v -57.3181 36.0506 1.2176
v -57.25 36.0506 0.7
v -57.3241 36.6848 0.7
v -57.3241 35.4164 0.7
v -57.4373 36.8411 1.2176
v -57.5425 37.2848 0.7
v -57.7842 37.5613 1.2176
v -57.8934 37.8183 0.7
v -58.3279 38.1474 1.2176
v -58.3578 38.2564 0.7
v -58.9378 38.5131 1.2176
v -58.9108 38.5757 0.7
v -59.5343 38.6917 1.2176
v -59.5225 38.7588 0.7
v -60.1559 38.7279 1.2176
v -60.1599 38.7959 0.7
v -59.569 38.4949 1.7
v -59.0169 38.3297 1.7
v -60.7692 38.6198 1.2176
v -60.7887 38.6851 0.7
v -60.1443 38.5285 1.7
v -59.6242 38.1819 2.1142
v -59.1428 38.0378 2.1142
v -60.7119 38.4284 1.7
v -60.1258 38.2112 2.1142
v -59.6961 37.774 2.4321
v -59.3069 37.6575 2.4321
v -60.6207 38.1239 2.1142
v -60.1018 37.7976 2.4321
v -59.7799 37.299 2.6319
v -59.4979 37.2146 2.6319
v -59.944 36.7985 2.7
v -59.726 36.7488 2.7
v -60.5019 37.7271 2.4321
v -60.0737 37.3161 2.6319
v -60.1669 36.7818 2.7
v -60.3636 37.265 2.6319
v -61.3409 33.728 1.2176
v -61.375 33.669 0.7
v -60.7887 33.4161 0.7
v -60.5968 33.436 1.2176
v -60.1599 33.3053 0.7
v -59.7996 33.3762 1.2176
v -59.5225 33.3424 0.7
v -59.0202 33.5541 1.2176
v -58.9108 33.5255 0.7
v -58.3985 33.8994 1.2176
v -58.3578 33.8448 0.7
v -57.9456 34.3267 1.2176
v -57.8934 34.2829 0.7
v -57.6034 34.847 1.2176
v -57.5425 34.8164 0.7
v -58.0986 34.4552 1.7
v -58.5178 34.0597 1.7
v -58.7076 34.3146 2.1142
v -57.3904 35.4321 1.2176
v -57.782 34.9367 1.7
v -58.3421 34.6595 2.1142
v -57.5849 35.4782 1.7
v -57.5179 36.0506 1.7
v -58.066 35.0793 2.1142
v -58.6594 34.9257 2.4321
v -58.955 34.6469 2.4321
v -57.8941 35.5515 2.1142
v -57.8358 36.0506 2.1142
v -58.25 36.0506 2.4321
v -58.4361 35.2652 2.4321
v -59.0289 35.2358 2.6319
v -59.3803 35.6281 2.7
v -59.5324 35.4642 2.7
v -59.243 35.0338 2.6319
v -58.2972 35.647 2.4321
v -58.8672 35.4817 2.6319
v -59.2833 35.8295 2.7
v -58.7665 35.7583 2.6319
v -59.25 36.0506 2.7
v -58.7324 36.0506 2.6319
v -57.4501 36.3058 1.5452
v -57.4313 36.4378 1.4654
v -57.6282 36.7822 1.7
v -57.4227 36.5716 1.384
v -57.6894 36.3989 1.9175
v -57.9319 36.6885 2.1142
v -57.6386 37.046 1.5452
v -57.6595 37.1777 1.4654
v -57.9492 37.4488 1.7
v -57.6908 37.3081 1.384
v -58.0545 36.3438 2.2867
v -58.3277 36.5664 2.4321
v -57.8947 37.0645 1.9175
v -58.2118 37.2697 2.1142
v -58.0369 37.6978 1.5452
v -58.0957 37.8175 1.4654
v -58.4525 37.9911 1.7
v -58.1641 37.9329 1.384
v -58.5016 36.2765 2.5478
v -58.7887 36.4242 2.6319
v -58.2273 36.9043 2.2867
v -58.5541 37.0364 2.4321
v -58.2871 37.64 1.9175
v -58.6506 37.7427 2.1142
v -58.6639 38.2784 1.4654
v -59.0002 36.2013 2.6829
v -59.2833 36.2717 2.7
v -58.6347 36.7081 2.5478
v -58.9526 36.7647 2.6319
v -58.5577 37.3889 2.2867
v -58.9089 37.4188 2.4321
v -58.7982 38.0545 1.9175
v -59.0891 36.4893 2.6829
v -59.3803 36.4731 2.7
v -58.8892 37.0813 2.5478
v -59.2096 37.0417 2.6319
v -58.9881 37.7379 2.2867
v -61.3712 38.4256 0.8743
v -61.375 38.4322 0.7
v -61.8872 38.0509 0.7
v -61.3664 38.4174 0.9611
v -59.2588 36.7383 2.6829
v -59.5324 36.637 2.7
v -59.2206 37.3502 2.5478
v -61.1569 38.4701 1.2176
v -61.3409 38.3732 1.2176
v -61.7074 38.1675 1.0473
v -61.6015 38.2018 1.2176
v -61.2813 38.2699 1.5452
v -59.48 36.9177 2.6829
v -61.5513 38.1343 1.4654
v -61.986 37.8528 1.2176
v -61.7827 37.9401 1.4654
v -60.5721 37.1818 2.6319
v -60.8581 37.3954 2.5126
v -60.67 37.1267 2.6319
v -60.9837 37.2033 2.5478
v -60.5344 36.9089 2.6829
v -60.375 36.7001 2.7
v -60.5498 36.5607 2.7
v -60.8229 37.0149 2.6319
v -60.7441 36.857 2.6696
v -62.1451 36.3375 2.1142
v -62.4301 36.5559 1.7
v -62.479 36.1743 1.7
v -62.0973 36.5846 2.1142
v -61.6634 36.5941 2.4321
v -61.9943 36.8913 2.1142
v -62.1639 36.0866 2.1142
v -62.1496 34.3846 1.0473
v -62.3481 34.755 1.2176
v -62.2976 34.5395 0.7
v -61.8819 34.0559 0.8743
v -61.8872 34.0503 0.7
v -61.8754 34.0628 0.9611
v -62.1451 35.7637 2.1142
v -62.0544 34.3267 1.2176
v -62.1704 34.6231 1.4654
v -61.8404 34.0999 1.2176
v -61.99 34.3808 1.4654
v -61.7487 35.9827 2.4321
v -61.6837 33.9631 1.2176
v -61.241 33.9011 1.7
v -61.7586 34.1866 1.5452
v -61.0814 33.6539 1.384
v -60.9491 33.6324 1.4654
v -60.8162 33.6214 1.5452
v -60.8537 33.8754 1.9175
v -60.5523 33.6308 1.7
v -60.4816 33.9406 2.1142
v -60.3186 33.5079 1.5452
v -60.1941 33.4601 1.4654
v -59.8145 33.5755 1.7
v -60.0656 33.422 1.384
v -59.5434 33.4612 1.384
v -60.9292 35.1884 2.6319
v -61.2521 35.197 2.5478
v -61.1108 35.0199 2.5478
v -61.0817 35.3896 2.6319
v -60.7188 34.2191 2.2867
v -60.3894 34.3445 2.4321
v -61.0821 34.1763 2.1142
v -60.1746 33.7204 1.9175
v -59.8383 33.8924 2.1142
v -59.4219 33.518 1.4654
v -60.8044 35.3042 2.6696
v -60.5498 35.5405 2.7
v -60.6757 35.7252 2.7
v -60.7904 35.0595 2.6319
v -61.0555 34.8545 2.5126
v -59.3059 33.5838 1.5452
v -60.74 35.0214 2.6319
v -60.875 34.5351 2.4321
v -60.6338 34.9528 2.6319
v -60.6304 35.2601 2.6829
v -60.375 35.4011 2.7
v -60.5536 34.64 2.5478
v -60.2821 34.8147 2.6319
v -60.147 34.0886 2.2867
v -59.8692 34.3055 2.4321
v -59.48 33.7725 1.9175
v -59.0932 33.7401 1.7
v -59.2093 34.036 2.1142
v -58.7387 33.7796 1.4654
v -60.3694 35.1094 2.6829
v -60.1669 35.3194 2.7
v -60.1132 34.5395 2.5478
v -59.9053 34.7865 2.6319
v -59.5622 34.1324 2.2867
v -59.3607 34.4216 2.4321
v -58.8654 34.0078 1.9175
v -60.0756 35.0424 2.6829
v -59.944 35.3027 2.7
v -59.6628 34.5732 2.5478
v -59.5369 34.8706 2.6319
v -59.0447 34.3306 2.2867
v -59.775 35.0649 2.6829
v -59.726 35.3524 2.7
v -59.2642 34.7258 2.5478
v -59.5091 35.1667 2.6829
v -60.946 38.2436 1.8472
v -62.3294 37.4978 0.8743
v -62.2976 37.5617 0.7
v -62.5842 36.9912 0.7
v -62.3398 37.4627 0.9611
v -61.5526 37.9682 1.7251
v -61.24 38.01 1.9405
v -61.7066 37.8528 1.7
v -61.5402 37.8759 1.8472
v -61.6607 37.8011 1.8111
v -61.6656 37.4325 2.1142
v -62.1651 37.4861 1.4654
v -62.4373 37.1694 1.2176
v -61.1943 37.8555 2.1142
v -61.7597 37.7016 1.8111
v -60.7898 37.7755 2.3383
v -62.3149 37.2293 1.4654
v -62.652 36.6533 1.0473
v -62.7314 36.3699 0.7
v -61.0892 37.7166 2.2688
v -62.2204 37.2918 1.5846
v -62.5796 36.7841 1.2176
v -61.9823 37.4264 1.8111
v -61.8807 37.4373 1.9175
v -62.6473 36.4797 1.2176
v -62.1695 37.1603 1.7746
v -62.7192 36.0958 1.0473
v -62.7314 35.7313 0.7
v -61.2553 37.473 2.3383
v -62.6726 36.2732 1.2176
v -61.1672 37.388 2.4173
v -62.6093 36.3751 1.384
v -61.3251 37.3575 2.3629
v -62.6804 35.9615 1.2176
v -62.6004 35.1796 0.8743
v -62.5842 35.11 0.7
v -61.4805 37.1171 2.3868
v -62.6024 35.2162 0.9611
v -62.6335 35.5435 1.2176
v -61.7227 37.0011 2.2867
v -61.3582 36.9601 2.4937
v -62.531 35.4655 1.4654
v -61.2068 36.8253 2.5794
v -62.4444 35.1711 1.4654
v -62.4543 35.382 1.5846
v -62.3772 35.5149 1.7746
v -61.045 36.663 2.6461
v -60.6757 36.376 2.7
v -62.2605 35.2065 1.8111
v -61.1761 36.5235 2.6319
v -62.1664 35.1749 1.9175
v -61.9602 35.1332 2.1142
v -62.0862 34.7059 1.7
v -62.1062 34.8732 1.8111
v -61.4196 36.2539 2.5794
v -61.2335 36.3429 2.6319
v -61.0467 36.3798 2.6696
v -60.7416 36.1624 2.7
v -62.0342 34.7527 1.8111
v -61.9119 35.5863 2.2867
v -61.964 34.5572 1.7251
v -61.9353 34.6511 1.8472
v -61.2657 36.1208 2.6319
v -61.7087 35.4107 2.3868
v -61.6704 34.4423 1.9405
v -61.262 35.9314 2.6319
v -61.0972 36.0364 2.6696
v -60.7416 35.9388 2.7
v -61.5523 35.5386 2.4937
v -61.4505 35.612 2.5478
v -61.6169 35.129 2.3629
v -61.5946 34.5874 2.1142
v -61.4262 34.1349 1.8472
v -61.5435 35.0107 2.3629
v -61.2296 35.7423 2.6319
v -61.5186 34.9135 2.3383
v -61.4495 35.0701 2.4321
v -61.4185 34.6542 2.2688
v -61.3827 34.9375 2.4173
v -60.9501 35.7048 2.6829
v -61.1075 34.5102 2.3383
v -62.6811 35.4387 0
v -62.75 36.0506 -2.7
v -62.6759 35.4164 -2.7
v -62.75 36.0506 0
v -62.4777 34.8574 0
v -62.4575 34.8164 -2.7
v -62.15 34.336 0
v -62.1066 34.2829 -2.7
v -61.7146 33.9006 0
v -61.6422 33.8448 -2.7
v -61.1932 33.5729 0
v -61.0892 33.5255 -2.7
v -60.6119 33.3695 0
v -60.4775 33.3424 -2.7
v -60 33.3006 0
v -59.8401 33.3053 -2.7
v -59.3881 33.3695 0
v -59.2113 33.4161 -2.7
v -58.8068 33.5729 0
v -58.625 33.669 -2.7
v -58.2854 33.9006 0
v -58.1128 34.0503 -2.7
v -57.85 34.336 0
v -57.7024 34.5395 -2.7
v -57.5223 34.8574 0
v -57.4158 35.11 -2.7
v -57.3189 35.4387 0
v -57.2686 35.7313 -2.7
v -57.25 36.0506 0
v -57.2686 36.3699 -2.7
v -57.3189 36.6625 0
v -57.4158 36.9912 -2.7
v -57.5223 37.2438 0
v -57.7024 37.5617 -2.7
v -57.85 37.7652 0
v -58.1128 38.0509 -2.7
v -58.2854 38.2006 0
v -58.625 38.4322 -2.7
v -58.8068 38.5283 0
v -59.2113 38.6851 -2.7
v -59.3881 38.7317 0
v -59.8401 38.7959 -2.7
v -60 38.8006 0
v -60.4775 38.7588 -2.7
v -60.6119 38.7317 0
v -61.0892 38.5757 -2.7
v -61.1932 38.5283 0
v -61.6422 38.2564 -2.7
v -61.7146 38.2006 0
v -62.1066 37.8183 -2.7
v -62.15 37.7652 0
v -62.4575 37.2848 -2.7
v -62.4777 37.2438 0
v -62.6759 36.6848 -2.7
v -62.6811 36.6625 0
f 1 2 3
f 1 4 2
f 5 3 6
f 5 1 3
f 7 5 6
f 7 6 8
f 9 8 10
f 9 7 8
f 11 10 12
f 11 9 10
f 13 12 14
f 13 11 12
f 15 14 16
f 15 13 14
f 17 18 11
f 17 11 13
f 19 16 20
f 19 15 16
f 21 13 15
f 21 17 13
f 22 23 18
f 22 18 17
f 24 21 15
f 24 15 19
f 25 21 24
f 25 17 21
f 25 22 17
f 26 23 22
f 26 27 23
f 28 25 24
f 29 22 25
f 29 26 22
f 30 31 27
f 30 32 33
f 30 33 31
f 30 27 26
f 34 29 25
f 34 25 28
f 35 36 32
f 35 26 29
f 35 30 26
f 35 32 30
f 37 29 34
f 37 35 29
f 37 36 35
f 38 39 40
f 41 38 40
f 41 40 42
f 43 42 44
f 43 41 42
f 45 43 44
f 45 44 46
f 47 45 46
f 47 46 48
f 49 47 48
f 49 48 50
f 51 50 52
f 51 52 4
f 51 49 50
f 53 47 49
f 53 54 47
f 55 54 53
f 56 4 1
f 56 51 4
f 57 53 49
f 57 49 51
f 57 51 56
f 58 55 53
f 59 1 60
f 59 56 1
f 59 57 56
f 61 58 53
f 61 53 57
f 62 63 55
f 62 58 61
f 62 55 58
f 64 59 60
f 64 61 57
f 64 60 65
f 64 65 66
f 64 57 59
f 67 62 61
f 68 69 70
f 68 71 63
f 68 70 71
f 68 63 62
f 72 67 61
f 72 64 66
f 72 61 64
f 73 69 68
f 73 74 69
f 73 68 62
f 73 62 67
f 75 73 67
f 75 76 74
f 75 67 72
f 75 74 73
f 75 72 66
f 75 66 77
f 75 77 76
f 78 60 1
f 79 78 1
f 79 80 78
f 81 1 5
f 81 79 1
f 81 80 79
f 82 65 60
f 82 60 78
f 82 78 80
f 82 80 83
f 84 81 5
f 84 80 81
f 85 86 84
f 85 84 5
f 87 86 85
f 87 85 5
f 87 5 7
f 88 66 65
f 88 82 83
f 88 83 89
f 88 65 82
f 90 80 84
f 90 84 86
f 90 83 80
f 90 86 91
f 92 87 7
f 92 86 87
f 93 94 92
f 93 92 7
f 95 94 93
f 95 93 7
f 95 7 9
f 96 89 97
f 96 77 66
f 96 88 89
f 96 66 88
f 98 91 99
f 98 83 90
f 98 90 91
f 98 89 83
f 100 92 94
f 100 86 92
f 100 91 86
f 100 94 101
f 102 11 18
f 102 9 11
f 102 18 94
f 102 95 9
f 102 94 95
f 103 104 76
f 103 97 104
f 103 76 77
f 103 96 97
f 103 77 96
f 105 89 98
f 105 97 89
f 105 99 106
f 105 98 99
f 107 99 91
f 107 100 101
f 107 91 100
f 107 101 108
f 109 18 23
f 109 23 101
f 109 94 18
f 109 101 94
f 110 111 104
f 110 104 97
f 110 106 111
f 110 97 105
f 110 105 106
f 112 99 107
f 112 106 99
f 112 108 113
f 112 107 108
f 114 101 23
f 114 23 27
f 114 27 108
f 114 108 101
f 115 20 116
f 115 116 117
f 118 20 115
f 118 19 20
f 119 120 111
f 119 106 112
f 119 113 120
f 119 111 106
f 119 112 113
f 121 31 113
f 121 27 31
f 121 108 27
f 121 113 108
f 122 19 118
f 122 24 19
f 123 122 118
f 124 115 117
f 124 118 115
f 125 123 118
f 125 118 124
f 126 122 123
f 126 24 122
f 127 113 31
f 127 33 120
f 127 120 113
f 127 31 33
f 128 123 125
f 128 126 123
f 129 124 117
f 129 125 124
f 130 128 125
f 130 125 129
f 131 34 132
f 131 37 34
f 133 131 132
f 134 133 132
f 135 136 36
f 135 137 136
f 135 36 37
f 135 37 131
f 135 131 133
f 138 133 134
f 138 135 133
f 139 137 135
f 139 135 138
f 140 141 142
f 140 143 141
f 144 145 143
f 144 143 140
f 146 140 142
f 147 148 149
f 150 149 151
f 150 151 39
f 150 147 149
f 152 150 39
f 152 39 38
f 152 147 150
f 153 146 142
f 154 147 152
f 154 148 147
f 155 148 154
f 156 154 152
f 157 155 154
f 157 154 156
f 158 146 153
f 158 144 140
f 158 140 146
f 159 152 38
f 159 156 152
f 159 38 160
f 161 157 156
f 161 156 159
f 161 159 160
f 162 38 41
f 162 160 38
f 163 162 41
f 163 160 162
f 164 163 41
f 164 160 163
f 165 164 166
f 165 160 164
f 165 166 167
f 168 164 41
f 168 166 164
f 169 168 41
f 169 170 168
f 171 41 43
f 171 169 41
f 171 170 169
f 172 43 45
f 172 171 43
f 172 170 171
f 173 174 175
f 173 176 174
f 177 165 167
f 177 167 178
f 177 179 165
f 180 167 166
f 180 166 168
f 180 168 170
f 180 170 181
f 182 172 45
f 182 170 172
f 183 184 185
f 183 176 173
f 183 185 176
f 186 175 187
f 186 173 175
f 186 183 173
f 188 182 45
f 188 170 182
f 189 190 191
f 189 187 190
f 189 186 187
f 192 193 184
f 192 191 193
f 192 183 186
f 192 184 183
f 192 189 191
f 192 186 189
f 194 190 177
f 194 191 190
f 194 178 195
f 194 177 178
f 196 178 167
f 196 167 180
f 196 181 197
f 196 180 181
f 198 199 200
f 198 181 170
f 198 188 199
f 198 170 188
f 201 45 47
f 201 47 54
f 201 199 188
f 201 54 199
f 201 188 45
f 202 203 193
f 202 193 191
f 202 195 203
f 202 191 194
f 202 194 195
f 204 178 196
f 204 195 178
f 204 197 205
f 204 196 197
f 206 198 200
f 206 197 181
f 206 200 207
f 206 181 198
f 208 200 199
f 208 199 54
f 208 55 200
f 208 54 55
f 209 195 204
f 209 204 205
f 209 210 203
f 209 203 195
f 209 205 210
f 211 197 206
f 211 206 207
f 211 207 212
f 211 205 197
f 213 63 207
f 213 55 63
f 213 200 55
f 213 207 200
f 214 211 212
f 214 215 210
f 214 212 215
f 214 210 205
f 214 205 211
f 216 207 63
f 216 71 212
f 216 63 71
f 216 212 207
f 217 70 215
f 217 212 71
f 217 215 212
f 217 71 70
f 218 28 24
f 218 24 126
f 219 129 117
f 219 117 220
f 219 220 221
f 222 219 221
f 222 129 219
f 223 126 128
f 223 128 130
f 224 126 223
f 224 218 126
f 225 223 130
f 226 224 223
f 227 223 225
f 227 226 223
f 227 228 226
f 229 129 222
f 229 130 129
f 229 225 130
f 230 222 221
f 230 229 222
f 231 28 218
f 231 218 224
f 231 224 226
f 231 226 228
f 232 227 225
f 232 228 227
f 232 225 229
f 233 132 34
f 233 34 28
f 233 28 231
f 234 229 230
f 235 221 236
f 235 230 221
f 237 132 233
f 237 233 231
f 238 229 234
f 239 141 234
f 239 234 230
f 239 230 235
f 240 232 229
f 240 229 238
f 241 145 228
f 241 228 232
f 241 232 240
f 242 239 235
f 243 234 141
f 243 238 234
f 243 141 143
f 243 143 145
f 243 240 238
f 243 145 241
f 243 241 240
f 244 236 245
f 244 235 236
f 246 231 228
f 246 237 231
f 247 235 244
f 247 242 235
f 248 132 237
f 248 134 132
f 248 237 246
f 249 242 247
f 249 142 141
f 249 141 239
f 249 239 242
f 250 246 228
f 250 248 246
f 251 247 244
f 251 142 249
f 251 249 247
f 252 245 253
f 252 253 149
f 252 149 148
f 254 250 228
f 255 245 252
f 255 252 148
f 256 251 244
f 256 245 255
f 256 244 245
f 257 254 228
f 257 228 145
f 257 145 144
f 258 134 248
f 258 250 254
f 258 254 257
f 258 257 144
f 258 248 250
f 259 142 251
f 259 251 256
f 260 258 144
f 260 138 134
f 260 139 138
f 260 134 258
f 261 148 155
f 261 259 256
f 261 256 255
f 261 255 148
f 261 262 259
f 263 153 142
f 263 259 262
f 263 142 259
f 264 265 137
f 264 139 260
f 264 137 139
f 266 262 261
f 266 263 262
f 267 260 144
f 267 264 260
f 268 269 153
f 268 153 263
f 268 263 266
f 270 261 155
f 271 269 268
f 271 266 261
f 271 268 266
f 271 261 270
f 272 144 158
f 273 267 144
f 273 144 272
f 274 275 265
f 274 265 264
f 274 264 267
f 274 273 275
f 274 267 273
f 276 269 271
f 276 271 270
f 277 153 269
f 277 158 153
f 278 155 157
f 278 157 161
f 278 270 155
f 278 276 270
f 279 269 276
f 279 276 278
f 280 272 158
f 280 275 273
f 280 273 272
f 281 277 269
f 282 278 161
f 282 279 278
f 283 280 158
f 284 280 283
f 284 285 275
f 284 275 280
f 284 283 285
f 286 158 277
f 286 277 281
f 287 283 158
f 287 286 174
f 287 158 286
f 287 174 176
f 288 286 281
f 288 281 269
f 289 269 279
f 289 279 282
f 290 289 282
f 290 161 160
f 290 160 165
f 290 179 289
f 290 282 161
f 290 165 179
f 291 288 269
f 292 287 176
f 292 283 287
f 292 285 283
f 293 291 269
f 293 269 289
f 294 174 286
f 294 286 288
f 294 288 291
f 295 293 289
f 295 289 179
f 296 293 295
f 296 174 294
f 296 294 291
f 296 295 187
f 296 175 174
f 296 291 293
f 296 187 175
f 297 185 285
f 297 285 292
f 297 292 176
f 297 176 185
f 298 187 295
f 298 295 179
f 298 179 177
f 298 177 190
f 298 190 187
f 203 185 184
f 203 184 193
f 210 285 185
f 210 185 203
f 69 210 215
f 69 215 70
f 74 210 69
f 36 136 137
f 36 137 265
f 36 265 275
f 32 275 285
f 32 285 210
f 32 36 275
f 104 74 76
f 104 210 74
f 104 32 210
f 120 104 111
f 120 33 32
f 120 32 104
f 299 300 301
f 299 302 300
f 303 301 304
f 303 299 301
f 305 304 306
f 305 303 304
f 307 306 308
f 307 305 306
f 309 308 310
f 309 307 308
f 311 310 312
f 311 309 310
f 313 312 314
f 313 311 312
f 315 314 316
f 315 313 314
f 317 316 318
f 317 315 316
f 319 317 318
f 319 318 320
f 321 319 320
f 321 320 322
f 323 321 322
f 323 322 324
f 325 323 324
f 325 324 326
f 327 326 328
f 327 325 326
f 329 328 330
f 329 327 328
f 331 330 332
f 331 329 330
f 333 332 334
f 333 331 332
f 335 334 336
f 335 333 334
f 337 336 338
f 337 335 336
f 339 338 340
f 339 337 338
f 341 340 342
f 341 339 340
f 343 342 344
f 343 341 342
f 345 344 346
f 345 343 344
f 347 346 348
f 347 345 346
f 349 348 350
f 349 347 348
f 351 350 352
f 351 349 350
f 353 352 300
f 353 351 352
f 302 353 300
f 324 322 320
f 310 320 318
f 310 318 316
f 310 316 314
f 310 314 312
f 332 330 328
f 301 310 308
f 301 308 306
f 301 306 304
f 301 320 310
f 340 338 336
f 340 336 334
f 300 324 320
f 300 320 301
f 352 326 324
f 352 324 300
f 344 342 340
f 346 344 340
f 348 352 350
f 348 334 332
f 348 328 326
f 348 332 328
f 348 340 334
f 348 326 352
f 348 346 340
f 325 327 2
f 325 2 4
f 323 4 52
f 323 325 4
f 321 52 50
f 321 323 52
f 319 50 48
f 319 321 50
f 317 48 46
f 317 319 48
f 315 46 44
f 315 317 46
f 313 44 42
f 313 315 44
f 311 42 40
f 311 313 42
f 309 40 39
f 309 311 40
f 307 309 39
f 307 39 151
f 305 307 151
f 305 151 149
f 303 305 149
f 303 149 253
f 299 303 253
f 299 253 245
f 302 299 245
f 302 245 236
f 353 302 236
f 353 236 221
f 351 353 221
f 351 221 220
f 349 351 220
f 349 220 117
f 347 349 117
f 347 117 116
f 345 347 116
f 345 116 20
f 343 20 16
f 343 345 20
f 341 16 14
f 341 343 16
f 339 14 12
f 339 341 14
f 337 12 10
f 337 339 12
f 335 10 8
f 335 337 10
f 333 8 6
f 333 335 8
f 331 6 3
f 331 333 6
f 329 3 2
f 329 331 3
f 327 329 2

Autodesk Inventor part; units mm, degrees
ref_plane "YZ Plane" through (0, 0, 0) normal (1, 0, 0) x (0, 1, 0)
ref_plane "XZ Plane" through (0, 0, 0) normal (0, 1, 0) x (-1, 0, 0)
ref_plane "XY Plane" through (0, 0, 0) normal (0, 0, 1) x (1, 0, 0)
sketch "Sketch1" plane through (0, 0, 0) normal (0, 0, 1) x (1, 0, 0)
  circle A0 centre (-60, 36.0506) radius 2.75
  dimension "d1" = 5.5
extrude "Extrusion1" add sketch "Sketch1" along normal blind 2.7
fillet "Fillet1" radius 2 1 edges at (-62.75, 36.0506, 2.7)
sketch "Sketch4" plane through (-60, 36.0506, 0) normal (0, 0, -1) x (-1, 0, 0)
  circle A0 centre (0, 0) radius 2.75
  dimension "d11" = 5.5
extrude "Extrusion3" add sketch "Sketch4" along normal blind 2.7
properties part number "d-padball"
